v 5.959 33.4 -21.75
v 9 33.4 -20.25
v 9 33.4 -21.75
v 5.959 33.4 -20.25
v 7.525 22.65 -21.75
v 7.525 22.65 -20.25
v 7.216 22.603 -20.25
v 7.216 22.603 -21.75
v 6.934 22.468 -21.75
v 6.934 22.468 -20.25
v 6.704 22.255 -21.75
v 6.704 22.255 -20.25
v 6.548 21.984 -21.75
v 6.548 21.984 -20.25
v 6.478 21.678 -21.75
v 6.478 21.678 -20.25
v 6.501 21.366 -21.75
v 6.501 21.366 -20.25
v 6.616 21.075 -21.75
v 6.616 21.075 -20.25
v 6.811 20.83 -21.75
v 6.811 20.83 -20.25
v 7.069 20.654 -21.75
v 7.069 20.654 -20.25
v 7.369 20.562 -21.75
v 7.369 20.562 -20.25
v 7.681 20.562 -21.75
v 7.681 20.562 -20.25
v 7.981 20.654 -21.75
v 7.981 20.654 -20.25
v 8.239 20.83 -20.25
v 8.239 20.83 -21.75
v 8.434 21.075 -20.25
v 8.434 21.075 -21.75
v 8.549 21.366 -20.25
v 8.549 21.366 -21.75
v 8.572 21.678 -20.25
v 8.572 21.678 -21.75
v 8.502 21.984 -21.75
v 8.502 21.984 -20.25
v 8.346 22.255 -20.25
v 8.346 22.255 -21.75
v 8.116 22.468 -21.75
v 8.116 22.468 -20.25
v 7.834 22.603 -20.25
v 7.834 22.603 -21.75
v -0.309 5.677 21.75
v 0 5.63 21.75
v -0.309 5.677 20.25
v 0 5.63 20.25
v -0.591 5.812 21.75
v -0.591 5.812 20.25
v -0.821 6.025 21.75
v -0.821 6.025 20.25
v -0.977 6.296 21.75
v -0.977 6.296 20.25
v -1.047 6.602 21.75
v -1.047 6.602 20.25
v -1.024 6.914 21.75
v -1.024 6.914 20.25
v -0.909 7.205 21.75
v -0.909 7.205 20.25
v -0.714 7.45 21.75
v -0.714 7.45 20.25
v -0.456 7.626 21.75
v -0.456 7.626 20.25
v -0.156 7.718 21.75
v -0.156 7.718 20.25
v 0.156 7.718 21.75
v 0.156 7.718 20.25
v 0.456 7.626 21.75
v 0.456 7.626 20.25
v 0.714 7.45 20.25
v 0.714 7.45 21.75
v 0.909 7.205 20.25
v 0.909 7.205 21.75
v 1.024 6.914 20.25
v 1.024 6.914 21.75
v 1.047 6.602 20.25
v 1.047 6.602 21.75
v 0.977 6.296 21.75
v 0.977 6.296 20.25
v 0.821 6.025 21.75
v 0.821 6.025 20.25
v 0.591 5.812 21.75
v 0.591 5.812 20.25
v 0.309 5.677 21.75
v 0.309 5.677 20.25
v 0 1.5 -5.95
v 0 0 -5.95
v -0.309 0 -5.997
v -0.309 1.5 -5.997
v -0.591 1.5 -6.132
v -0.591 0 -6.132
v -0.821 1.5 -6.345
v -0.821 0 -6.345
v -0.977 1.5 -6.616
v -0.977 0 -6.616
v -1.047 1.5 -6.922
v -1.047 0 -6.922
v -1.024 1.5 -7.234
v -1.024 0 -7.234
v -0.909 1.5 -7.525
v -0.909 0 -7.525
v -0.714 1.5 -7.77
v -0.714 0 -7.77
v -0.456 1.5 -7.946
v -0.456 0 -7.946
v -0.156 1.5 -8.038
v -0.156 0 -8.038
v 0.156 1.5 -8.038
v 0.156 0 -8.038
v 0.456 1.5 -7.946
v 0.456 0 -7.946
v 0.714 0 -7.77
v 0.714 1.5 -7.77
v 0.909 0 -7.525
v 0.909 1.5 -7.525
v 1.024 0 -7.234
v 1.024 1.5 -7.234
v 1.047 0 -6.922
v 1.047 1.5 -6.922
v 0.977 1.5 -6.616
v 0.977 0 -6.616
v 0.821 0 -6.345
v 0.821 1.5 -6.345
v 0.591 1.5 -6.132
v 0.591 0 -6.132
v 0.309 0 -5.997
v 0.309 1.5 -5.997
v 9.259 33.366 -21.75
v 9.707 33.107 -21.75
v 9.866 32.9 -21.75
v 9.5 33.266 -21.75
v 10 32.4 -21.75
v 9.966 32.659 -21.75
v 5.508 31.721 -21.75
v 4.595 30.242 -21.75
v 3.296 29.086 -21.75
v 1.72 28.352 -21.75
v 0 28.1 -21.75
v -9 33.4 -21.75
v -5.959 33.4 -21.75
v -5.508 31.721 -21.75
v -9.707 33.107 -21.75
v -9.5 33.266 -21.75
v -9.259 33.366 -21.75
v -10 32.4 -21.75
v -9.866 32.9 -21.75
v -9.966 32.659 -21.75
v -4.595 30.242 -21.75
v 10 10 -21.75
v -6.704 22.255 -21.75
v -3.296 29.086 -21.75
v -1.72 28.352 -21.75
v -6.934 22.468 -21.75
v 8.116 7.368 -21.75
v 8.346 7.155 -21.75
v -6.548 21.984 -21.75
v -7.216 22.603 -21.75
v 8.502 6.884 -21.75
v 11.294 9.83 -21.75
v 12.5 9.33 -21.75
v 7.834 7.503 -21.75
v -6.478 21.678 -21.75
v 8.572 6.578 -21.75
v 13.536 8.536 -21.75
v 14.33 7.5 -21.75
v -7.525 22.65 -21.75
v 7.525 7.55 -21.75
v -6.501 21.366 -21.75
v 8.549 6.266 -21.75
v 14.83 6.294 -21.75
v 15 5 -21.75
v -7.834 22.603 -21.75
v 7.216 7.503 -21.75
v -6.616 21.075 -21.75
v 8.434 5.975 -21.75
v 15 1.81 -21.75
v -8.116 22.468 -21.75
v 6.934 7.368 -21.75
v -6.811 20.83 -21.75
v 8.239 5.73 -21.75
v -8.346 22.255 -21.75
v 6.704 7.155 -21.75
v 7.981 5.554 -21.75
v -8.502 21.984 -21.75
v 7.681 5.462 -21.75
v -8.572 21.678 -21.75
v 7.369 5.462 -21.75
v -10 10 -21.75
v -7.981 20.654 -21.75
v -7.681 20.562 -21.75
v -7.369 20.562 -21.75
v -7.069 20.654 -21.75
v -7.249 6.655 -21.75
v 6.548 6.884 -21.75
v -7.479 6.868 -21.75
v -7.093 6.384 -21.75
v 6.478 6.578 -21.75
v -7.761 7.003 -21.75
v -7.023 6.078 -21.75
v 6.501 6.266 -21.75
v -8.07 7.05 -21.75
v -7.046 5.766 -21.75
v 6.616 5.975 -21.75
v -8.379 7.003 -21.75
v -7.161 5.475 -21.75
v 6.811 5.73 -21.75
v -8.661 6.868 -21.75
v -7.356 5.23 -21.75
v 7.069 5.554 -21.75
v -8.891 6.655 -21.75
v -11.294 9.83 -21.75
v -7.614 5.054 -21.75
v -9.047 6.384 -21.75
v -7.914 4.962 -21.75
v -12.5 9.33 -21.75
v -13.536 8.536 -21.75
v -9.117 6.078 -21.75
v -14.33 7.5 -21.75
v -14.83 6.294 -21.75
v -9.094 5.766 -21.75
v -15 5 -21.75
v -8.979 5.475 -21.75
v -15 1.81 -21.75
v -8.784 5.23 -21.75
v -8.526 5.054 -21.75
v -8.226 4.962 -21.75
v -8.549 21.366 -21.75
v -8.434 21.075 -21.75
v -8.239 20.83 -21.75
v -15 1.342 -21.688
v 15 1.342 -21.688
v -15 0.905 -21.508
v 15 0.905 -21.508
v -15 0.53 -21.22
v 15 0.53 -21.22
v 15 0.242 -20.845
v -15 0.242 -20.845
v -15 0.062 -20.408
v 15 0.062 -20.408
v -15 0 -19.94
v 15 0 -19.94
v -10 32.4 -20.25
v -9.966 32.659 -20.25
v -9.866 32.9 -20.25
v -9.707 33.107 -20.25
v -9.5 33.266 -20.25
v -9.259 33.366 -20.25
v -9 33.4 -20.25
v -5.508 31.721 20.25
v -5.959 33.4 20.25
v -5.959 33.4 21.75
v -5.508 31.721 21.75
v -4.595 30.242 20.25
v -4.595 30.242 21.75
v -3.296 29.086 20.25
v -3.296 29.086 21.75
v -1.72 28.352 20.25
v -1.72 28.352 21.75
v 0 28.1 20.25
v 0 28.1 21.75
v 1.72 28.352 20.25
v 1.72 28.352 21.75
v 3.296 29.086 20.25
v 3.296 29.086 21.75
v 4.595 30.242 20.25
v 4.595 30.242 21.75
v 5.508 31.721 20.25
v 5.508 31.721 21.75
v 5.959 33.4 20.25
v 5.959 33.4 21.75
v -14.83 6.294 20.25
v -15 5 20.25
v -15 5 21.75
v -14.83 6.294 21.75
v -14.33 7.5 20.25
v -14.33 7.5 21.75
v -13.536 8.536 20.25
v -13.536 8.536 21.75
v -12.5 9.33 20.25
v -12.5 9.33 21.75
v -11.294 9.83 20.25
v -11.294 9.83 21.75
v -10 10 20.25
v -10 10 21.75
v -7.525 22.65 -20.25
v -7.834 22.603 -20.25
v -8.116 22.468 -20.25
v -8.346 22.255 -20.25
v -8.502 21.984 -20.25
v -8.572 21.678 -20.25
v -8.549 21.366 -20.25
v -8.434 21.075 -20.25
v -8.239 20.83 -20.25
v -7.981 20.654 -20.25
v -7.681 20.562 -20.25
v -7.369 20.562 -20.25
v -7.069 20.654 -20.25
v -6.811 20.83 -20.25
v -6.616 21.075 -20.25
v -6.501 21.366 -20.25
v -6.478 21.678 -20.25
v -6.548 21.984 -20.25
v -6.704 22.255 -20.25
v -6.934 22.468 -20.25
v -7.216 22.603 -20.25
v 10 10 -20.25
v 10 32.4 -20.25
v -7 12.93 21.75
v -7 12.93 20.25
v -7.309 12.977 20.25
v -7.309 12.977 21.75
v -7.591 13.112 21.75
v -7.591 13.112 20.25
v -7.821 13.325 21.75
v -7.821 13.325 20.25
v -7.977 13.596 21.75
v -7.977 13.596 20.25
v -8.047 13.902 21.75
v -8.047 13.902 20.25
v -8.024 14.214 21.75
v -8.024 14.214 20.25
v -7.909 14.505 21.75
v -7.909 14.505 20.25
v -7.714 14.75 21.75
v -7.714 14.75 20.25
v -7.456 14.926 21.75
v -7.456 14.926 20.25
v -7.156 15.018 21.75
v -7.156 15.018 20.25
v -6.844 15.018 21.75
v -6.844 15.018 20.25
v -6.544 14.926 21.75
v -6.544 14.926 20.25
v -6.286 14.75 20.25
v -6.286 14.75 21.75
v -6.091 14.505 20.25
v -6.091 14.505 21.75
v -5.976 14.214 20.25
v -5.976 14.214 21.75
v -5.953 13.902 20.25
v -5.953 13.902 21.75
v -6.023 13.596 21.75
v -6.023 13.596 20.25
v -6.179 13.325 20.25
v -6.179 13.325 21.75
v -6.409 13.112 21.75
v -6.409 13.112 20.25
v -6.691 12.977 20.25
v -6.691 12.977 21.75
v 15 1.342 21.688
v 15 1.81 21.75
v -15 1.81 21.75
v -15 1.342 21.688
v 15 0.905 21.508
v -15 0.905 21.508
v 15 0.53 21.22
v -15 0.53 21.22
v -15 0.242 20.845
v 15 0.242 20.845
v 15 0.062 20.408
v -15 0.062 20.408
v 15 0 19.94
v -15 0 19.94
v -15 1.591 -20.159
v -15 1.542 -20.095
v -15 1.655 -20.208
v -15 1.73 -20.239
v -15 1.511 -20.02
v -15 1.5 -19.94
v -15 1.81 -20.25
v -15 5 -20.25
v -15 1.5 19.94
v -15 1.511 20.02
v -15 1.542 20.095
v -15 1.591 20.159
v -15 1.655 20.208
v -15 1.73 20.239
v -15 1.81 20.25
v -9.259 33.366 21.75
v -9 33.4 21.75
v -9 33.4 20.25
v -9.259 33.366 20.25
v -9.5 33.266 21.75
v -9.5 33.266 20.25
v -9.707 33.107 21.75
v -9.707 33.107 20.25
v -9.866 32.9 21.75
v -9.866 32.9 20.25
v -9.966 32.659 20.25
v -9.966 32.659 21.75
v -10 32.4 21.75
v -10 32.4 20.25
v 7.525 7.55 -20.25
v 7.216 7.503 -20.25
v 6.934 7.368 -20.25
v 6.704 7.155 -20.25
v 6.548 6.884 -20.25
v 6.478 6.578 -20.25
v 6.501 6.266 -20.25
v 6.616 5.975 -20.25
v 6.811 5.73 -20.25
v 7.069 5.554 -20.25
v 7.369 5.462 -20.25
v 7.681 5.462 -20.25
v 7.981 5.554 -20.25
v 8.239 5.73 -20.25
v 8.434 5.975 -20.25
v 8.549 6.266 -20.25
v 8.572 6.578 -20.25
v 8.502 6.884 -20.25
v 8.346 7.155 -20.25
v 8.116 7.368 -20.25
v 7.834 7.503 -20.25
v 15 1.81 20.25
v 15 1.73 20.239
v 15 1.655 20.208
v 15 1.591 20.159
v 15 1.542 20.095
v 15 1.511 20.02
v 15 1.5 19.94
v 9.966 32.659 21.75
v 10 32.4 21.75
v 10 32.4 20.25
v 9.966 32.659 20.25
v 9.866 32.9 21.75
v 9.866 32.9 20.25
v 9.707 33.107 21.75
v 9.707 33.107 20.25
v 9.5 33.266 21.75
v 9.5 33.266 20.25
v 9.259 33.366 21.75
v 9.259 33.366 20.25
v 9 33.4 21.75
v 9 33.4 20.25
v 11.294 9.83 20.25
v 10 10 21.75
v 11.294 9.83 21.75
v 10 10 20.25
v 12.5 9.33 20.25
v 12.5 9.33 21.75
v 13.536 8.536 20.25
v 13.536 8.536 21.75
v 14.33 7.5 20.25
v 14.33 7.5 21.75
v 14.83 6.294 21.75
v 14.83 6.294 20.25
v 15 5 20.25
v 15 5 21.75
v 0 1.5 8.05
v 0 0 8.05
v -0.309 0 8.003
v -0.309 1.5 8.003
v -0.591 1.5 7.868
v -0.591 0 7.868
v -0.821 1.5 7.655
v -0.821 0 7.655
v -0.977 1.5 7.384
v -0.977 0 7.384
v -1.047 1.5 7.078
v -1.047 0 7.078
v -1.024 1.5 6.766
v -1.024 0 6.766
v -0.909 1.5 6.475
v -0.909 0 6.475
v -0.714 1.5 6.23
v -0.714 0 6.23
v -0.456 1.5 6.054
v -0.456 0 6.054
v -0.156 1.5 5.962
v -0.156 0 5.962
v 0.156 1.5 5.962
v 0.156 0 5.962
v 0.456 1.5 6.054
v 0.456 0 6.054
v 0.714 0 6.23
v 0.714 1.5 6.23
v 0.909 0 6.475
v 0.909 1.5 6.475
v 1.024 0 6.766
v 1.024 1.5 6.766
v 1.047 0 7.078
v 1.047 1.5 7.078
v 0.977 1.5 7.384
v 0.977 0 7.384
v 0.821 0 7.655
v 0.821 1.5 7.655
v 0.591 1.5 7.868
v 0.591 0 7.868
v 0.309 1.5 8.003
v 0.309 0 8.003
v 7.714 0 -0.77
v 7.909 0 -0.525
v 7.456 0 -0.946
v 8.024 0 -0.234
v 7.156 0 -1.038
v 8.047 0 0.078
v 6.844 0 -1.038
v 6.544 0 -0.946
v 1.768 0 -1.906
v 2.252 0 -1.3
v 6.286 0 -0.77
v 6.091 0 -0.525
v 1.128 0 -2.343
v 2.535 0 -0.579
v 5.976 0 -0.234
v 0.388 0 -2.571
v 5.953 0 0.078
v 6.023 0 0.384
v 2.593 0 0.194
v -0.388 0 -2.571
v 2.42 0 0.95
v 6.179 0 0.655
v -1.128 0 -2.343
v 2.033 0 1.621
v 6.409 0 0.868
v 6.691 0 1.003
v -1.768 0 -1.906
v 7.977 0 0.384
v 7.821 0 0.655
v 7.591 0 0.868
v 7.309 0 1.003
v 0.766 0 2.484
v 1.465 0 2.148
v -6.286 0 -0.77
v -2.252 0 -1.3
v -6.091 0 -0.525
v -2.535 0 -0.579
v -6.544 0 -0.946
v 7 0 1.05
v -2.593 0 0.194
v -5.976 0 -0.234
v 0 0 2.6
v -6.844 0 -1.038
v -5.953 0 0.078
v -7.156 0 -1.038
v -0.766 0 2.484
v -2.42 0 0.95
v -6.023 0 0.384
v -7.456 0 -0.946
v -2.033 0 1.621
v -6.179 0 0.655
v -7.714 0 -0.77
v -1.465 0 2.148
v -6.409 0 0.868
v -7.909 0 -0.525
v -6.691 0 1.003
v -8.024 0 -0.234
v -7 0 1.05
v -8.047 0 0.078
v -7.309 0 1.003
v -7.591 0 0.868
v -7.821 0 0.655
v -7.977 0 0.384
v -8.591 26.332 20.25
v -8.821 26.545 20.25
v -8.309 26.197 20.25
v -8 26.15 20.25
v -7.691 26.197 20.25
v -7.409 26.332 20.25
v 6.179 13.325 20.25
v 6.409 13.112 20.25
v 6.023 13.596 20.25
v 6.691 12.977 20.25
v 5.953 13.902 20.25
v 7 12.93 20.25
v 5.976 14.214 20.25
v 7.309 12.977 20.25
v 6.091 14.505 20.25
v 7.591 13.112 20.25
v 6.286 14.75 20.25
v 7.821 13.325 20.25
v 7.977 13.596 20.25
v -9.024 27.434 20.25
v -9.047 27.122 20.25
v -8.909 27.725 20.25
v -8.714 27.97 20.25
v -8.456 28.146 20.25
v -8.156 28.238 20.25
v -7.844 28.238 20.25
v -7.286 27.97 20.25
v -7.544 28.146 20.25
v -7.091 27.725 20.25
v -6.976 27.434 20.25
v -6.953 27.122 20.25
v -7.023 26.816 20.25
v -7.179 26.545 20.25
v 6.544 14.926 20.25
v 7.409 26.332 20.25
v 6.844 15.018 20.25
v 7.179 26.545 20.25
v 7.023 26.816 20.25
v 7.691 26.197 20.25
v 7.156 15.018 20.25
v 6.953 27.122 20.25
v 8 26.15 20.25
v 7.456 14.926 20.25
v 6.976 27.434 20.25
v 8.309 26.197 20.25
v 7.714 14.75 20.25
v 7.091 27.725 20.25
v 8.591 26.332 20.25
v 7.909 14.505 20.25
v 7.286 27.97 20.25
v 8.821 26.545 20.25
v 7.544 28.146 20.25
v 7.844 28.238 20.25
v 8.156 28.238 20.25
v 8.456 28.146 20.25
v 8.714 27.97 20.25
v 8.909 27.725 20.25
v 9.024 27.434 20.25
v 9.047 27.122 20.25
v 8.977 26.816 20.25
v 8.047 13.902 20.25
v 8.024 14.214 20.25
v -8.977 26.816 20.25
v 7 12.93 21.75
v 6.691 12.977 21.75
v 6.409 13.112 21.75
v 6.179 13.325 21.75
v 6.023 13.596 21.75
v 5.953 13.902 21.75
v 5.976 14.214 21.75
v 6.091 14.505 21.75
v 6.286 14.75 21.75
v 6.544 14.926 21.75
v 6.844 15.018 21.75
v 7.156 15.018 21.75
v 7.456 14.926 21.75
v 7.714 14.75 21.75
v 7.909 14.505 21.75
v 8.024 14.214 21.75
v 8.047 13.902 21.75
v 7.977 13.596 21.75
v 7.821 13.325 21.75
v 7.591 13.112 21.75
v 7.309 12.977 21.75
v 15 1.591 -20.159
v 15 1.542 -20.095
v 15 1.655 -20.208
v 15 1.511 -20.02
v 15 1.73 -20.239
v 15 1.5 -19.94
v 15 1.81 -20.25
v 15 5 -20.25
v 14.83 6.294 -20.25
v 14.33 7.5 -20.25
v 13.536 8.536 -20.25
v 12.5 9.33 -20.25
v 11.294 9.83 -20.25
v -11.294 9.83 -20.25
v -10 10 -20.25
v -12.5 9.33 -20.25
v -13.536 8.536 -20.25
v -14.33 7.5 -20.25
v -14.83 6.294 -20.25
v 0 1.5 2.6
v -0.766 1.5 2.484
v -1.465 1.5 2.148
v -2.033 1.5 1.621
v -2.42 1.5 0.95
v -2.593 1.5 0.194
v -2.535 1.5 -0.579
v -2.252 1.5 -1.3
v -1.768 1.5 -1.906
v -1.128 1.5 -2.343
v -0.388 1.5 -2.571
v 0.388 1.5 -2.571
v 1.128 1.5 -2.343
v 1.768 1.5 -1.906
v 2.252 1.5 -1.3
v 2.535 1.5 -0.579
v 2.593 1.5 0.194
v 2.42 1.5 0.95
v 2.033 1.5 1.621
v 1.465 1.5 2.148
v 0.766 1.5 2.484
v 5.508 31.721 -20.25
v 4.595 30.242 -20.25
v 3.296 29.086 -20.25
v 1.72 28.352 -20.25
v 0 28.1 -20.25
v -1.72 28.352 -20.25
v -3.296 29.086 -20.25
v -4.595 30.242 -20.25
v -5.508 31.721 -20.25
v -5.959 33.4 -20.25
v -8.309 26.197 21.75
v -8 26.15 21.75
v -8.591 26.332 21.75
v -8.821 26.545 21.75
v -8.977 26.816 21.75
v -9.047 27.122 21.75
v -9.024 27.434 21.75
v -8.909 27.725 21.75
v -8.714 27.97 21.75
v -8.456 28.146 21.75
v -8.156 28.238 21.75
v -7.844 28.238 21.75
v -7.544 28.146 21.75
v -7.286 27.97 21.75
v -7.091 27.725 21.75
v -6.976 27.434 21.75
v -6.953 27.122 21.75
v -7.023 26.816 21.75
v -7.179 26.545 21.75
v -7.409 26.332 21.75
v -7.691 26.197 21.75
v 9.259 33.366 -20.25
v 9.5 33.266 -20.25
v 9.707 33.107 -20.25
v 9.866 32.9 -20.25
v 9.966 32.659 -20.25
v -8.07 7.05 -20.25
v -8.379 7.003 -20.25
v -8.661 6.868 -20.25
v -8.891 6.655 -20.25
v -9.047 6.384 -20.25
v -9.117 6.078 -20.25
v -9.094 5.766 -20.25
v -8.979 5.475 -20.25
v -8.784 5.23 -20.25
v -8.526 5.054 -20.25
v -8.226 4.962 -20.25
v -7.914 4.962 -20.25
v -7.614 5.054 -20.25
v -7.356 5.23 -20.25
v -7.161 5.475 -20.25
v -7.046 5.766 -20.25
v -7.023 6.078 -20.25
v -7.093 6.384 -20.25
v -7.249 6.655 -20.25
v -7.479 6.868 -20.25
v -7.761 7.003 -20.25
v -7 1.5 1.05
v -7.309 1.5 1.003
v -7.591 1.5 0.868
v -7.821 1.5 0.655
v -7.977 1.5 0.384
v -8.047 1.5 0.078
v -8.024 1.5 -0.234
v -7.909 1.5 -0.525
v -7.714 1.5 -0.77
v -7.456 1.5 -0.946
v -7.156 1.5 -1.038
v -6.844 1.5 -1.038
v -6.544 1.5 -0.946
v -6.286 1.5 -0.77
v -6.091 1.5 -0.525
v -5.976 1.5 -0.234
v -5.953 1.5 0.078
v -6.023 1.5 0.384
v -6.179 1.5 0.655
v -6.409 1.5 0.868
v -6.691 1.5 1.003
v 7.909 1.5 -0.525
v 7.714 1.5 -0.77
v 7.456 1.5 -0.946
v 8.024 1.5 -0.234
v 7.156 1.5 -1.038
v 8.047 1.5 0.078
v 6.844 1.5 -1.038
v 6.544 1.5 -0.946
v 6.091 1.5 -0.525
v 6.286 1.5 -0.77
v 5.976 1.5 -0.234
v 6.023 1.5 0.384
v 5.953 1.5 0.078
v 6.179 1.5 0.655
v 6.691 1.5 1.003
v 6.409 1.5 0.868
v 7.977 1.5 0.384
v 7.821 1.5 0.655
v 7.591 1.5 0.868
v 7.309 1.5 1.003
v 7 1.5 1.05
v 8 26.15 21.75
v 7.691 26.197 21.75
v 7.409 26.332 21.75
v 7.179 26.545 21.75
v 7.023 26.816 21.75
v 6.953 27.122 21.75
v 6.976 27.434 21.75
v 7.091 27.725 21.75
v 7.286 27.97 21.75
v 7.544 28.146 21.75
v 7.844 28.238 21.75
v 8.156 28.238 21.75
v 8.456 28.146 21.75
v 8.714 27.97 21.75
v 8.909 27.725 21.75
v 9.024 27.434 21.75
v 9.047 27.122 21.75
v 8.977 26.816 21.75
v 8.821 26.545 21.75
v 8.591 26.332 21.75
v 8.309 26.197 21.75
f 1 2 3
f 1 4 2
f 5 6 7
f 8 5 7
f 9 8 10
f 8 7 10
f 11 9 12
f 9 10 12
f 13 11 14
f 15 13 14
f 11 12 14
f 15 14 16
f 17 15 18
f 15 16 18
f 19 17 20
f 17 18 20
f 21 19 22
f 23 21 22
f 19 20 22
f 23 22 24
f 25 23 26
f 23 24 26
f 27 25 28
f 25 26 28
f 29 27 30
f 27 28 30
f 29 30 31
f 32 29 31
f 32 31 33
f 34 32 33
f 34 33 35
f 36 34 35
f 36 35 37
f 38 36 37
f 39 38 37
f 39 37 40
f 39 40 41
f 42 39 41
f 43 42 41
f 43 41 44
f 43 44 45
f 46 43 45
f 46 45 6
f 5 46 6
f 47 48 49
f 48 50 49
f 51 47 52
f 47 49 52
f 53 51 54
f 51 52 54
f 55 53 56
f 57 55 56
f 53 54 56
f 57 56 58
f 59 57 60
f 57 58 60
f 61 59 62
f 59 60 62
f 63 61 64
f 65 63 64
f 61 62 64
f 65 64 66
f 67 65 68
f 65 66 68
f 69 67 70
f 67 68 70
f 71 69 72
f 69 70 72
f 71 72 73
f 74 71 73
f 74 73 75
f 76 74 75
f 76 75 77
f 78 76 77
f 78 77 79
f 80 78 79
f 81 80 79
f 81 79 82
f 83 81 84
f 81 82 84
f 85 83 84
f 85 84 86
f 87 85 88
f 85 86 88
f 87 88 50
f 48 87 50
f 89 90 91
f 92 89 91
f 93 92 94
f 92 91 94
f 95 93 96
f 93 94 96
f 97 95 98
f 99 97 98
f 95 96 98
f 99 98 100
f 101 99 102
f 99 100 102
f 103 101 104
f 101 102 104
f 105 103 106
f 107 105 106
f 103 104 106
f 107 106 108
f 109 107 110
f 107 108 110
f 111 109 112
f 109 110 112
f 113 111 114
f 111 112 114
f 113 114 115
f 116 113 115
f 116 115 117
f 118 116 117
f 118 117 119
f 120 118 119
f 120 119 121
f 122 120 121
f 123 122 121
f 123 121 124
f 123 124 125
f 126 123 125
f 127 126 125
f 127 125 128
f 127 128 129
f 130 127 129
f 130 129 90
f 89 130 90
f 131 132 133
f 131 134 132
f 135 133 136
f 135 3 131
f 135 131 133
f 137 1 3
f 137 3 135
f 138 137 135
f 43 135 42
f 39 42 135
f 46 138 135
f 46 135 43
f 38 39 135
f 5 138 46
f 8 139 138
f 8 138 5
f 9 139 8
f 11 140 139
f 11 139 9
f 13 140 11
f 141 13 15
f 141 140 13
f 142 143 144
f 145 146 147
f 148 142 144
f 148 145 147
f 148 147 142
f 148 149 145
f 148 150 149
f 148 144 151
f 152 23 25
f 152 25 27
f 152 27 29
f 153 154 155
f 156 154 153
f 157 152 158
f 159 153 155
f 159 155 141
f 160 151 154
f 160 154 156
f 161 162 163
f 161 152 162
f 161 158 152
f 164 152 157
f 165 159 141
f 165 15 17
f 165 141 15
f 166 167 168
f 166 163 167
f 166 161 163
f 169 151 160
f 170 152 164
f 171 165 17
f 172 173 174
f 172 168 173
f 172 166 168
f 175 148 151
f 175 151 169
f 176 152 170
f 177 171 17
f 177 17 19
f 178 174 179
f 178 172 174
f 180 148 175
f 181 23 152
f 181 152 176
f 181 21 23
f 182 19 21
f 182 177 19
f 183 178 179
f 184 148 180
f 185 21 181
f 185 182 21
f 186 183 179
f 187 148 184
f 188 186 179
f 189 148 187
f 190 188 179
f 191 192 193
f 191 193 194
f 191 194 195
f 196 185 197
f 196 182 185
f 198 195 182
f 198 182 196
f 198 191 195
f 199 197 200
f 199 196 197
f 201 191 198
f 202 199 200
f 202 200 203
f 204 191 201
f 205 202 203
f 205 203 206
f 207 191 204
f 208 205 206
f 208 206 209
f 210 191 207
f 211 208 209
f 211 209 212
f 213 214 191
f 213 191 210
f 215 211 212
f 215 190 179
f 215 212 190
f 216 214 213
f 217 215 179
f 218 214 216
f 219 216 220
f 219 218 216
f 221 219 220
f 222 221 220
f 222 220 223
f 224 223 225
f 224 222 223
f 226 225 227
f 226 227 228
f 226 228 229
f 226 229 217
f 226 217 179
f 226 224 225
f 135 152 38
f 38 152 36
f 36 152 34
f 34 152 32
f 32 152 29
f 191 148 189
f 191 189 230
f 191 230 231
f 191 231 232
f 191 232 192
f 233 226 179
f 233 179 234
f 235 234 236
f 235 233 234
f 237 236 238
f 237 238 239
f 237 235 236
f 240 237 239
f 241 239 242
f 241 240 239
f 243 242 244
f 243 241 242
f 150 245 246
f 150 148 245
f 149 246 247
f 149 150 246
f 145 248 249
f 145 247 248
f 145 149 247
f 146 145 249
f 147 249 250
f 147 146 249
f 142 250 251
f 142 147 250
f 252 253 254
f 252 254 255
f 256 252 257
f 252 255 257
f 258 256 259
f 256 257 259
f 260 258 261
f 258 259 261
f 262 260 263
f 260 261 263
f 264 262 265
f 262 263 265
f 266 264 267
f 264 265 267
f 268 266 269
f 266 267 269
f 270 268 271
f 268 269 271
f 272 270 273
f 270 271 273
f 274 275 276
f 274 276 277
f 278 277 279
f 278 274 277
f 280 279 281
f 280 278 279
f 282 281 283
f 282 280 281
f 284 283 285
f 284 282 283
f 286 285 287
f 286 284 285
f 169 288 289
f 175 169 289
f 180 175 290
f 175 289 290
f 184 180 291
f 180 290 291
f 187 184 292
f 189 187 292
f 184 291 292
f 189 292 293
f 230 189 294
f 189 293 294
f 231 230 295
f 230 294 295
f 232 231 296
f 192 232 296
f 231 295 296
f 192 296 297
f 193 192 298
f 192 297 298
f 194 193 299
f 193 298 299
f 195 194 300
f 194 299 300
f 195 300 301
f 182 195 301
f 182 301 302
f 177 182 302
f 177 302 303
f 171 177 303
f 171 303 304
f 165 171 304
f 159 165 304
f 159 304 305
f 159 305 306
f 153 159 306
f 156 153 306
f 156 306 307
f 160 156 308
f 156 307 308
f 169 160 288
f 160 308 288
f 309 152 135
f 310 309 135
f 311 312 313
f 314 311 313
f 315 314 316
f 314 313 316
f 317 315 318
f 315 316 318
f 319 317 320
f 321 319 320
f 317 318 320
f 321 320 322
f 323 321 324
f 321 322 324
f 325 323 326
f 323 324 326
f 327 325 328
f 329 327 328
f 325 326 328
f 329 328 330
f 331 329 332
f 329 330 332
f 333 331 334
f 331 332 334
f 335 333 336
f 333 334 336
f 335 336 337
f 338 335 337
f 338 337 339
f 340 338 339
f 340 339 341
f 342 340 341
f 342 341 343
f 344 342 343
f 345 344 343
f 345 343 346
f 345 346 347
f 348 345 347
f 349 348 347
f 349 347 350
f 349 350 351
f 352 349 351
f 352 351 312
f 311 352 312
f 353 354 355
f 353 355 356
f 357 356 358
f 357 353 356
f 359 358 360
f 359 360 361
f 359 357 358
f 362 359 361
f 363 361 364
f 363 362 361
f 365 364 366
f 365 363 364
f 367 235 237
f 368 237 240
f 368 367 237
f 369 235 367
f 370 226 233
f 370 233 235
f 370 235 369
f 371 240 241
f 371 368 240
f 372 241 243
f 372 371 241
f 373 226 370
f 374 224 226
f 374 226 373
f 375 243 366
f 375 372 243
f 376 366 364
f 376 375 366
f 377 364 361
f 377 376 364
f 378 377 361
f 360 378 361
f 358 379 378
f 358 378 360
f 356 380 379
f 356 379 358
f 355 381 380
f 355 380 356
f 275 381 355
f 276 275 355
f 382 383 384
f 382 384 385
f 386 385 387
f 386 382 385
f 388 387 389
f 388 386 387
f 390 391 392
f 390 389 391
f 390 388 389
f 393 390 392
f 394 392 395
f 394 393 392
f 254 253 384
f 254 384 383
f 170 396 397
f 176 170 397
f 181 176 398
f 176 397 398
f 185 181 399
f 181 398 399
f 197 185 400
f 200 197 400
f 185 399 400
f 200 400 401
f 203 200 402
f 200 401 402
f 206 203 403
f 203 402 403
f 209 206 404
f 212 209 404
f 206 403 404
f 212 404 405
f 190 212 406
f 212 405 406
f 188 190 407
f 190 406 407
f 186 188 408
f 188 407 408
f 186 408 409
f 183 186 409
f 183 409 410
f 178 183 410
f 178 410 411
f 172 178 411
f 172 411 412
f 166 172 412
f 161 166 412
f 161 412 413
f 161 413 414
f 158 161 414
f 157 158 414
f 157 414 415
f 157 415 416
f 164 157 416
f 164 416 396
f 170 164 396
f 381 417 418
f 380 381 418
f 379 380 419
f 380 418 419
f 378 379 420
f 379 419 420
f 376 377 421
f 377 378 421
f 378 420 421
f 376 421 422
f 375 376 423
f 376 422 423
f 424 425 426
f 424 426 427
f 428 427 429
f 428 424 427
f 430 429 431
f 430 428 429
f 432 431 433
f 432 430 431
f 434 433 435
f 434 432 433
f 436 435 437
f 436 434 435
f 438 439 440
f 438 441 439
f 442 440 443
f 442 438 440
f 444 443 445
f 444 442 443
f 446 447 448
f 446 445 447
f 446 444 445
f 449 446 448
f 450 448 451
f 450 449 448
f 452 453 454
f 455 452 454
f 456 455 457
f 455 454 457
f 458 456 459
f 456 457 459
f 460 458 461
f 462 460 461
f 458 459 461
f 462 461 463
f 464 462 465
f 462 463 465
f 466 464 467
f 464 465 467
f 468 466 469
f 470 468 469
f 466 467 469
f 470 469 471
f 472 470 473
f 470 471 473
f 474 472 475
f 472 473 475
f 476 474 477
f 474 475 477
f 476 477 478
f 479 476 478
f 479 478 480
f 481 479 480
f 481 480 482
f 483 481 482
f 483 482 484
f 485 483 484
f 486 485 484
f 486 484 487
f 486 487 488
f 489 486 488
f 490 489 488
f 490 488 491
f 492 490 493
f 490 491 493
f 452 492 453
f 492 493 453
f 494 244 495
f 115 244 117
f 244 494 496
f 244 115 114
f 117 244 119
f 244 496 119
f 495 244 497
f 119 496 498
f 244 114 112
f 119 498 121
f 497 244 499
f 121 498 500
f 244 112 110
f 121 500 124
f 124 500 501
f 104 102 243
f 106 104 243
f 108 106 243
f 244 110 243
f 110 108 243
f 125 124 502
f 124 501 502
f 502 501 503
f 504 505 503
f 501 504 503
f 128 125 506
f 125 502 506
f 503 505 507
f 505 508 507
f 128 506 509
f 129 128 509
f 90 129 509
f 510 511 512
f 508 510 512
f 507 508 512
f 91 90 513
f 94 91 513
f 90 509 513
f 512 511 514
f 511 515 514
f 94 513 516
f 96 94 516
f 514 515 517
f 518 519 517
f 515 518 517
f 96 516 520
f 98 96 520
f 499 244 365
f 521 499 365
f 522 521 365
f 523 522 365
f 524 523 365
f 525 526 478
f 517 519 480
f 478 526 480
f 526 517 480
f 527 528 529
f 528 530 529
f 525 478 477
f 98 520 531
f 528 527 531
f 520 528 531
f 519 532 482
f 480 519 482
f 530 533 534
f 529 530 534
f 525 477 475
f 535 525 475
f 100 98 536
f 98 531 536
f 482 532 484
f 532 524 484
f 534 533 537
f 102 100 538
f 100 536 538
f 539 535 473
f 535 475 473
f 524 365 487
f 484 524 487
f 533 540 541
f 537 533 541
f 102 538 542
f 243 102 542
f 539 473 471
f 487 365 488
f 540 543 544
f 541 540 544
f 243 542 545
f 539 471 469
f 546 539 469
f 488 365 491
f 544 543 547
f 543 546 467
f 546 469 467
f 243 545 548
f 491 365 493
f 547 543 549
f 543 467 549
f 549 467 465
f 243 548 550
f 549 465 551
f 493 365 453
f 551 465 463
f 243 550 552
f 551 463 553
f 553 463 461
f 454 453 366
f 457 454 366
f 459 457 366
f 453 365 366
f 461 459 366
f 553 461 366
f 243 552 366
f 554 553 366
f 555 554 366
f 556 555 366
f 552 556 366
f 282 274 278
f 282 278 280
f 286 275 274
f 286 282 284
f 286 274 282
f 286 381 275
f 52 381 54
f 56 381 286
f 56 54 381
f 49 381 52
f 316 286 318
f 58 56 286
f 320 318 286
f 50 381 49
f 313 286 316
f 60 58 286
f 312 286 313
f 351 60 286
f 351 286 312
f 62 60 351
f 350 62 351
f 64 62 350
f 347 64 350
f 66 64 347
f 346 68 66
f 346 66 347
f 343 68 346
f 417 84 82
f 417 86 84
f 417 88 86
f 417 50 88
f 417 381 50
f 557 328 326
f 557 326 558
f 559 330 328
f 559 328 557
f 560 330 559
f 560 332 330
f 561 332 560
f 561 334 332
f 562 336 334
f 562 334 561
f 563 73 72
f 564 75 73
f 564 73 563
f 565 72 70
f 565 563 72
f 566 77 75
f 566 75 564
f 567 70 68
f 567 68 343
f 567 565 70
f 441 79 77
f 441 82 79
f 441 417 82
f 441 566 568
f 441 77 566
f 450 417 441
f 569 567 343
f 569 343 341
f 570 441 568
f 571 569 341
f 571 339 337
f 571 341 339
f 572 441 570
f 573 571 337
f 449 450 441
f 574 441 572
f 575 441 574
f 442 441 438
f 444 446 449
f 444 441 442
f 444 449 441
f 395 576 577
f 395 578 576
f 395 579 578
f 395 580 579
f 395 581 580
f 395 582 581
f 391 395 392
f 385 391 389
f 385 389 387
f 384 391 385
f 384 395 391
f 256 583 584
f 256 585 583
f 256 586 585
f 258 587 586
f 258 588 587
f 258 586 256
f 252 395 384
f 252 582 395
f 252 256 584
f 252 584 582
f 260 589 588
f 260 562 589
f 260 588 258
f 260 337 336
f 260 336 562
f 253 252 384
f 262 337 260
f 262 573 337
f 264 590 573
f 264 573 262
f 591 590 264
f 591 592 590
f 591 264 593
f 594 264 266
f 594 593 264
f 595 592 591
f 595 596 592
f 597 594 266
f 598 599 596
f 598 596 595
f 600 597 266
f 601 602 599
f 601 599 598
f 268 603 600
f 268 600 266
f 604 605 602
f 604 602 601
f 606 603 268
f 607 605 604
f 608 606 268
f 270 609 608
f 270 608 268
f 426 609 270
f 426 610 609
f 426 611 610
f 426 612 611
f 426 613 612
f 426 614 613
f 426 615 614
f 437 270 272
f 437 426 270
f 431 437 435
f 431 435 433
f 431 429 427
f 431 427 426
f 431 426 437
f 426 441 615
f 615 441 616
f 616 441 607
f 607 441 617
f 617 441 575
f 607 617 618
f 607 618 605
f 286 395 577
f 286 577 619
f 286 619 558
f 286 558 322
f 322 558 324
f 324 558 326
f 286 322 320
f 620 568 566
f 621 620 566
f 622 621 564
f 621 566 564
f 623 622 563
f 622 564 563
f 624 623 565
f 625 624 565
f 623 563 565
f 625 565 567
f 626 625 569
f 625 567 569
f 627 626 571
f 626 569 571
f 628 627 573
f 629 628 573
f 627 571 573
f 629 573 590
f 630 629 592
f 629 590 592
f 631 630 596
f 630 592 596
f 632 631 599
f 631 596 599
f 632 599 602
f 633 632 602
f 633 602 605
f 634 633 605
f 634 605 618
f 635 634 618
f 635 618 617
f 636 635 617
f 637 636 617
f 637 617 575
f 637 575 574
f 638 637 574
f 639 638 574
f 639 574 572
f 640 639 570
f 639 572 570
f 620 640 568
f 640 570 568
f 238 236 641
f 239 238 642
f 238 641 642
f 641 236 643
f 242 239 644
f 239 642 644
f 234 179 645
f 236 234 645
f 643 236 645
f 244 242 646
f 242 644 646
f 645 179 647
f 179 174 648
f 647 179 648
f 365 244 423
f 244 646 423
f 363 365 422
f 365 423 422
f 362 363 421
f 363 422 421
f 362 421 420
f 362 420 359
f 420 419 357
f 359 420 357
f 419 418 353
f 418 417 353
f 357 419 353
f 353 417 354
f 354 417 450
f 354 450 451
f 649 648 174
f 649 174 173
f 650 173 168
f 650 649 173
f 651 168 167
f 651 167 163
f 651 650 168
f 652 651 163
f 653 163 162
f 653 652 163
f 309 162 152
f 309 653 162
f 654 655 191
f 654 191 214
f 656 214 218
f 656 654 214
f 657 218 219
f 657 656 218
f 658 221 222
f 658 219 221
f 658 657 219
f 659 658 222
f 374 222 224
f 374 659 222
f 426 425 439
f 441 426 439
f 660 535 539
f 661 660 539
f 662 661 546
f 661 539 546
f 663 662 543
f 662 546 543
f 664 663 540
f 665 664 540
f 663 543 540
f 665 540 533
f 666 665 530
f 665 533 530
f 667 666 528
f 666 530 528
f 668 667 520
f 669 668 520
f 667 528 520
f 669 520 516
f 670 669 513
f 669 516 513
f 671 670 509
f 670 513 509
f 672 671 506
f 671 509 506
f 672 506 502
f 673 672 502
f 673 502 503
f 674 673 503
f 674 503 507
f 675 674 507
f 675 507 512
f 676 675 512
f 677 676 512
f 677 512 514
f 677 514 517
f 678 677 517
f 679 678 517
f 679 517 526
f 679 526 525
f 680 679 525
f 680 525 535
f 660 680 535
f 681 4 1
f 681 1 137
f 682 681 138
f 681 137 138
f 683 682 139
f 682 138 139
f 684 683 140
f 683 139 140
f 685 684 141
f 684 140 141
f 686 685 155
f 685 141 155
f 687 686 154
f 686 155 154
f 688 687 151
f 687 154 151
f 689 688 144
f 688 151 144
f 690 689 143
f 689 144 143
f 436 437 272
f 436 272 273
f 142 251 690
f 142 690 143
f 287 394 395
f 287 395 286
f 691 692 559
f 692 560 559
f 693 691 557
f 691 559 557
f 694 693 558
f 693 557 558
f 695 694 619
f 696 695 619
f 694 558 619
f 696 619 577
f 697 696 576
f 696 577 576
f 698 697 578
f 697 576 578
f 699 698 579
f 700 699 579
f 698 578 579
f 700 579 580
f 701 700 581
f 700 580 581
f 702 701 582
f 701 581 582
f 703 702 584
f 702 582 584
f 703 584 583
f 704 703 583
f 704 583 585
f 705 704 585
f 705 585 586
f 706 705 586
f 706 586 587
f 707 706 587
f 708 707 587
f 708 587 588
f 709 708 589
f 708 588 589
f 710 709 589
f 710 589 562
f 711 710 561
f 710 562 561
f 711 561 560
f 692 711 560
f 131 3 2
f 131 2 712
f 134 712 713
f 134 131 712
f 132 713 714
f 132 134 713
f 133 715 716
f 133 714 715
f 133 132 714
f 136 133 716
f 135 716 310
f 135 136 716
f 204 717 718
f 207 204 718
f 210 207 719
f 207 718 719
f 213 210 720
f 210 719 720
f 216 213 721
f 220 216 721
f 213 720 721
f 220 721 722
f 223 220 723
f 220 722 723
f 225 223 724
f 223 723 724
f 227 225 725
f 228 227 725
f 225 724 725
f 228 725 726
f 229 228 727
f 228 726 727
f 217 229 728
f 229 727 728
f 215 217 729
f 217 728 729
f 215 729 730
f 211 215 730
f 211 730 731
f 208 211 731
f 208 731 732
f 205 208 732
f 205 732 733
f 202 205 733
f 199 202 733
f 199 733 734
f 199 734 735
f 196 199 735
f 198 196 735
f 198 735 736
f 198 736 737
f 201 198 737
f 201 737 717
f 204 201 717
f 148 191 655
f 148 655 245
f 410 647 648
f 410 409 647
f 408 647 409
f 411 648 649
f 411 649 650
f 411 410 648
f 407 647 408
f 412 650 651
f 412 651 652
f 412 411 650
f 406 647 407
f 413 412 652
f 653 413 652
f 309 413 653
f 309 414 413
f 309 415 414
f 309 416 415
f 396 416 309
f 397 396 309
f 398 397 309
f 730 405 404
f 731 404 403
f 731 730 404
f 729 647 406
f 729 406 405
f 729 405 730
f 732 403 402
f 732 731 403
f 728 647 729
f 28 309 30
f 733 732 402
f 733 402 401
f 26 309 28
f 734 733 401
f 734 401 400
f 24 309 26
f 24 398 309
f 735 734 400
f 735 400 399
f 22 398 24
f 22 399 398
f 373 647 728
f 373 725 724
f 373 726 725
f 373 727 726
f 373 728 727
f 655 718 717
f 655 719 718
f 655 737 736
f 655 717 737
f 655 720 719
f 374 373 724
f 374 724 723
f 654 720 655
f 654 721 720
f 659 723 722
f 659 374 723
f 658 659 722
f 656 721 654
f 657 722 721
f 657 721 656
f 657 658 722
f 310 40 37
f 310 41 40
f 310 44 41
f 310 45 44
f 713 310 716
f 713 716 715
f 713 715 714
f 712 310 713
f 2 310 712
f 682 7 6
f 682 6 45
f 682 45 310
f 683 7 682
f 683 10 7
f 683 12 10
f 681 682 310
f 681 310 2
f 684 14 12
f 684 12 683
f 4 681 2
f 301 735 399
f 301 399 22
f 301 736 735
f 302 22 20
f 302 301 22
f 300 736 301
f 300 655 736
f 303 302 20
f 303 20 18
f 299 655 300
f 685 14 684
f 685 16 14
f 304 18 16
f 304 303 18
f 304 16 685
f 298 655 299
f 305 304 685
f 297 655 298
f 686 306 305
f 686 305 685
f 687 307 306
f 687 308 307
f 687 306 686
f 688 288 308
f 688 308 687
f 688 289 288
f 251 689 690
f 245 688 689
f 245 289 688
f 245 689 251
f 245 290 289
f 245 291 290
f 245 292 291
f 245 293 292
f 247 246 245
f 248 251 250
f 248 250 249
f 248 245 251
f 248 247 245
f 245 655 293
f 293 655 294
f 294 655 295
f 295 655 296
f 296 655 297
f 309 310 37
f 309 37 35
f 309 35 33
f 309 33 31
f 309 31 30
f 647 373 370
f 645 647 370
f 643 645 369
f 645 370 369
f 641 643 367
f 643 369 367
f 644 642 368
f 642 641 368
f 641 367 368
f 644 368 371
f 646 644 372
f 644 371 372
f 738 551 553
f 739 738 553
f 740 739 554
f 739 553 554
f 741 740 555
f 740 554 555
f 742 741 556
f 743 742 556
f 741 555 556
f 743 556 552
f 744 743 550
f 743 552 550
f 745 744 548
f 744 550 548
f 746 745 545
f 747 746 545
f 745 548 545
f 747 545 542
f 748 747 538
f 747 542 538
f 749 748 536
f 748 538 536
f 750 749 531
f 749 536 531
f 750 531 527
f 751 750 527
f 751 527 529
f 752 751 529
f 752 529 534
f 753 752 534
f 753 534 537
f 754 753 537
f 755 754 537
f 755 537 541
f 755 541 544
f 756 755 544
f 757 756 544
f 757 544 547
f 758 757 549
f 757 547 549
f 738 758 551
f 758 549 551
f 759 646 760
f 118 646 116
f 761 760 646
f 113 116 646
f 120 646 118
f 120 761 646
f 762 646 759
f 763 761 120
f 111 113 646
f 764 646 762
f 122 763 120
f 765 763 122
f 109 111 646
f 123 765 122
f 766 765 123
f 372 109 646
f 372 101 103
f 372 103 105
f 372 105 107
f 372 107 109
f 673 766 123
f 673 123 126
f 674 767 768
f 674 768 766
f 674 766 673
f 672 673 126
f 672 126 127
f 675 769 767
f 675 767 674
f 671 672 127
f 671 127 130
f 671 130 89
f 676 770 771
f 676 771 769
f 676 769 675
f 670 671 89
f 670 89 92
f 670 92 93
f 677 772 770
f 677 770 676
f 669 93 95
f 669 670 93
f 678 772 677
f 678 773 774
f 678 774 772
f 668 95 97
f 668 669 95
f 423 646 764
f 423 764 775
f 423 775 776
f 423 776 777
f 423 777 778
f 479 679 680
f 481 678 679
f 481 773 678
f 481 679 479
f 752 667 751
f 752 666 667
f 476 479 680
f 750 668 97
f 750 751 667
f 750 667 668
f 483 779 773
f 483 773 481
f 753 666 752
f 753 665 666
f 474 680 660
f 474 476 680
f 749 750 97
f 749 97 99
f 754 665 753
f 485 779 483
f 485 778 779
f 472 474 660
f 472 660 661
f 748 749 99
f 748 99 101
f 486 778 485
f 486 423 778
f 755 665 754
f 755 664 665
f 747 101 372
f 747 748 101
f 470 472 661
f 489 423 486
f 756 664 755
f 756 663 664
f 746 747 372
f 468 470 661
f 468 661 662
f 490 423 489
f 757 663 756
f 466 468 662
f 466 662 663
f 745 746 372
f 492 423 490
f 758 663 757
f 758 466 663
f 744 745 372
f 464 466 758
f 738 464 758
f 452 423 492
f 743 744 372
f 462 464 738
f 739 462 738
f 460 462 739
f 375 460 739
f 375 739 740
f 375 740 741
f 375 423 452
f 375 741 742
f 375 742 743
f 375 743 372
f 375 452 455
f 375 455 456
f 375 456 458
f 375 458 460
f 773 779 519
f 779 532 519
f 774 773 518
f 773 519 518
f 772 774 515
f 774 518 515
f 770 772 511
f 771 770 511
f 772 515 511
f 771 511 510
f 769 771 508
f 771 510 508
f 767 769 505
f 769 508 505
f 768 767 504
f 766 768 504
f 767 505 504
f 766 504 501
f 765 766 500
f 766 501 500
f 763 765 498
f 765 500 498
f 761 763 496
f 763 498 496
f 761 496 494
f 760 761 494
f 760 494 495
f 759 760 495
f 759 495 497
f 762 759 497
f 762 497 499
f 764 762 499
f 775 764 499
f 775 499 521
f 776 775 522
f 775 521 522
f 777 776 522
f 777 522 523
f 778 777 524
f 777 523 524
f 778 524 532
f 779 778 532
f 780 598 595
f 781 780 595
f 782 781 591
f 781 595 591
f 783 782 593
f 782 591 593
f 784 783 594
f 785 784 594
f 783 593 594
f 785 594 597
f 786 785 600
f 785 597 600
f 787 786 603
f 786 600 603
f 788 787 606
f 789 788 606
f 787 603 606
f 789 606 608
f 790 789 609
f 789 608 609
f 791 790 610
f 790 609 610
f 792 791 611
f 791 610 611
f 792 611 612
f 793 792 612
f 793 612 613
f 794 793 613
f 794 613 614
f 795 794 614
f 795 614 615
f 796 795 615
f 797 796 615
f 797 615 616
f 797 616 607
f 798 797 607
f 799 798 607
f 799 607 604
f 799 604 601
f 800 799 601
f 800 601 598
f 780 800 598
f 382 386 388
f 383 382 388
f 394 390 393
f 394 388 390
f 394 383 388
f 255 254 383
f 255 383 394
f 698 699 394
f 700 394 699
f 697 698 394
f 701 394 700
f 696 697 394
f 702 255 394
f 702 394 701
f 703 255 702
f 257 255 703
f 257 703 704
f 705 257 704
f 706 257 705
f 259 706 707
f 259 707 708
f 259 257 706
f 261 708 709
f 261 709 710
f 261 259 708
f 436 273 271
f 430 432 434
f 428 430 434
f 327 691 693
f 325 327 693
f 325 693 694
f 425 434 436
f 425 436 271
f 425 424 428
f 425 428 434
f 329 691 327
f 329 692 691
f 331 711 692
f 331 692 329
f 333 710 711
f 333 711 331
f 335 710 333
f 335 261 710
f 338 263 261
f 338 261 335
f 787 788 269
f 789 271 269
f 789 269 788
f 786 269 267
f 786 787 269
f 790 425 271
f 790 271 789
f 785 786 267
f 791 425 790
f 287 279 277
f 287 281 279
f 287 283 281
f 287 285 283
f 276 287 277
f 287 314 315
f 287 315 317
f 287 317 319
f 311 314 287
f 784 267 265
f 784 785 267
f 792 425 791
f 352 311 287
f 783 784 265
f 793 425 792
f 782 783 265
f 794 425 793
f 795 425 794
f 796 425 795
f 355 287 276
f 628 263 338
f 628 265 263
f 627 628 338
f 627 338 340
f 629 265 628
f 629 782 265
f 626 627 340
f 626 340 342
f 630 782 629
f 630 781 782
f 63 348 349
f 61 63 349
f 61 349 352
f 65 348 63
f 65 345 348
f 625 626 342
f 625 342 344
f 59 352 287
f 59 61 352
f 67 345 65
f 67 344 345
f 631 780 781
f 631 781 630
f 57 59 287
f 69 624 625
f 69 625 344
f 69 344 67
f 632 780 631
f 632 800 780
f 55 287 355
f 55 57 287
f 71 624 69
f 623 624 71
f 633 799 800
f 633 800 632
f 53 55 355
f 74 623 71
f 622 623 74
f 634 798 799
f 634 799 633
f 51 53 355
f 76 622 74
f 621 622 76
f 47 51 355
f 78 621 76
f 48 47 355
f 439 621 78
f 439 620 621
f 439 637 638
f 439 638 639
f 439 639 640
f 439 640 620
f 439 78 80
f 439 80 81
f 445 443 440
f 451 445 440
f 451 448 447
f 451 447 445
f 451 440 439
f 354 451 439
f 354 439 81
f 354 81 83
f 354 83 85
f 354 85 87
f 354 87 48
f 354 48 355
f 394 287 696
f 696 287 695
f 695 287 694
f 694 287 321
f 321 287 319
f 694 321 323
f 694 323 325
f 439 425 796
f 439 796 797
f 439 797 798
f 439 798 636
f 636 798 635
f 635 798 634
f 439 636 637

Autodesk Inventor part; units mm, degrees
ref_plane "YZ Plane" through (0, 0, 0) normal (1, 0, 0) x (0, 1, 0)
ref_plane "XZ Plane" through (0, 0, 0) normal (0, 1, 0) x (-1, 0, 0)
ref_plane "XY Plane" through (0, 0, 0) normal (0, 0, 1) x (1, 0, 0)
sketch "Sketch1" plane through (0, 0, 0) normal (0, 1, 0) x (-1, 0, 0)
  line L0 (-15, 20.25) -> (15, 20.25)
  line L1 (15, 20.25) -> (15, -20.25)
  line L2 (15, -20.25) -> (-15, -20.25)
  line L3 (-15, -20.25) -> (-15, 20.25)
  line L4 (-15, 20.25) -> (15, -20.25) construction
  line L5 (15, 20.25) -> (-15, -20.25) construction
  point P0 (0, 0)
  dimension "d0" = 40.5
  dimension "d1" = 30
extrude "Plate1" add sketch "Sketch1" along normal blind 1.5
sketch "Sketch2" plane through (-15, 0, -21.75) normal (0, 0, 1) x (1, 0, 0)
  line L0 (30, 0) -> (0, 0)
  line L1 (0, 0) -> (0, 33.4)
  line L2 (0, 33.4) -> (30, 33.4)
  line L3 (30, 33.4) -> (30, 0)
edge flange "Flange1" height 33.4 angle 90 thickness 1.5 bend radius 0.31 thickness toward (0, 0, 1) relief tear relief width 1.5 relief depth 0.75 corner gap 0.31 corner form 0 edges at (0, 1.5, -20.25) (0, 1.5, 20.25) wall of the first edge with corners at (15, 0, -21.75) (-15, 0, -21.75) (-15, 33.4, -21.75) (15, 33.4, -21.75)
bend "Bend1"
corner "Corner1"
sketch "Sketch3" plane through (0, 1.5, 0) normal (0, 1, 0) x (1, 0, 0)
  circle A0 centre (7, 0) radius 0.7835 projected
  circle A1 centre (0, -7) radius 0.7835 projected
  circle A2 centre (-7, 0) radius 0.7835 projected
  circle A3 centre (0, 7) radius 0.7835 projected
  point P0 (0, 0)
hole "Hole1" at (0, 1.5, 7) at (7, 1.5, 0) at (-7, 1.5, 0) at (0, 1.5, -7) direction (0, -1, 0) diameter 2.1 depth 1.5
sketch "Sketch26" plane through (-15, 33.4, 21.75) normal (0, 0, 1) x (1, 0, 0)
  line L0 (30, 11.6) -> (25, 11.6)
  line L1 (25, 11.6) -> (25, -23.4)
  line L2 (25, -23.4) -> (30, -23.4)
  line L3 (30, -23.4) -> (30, 11.6)
  line L4 (0, 11.6) -> (5, 11.6)
  line L5 (5, 11.6) -> (5, -23.4)
  line L6 (5, -23.4) -> (0, -23.4)
  line L7 (0, -23.4) -> (0, 11.6)
  point P0 (15, -33.4)
  dimension "d91" = 35
  dimension "d92" = 5
  dimension "d93" = 10
  dimension "d94" = 10
  dimension "d95" = 5
  dimension "d96" = 35
  dimension "d97" = 10
  dimension "d98" = 10
extrude "Cut11" cut sketch "Sketch26" against normal blind 1.5
fillet "Corner Round1" radius 5 1 edges at (-15, 10, 21)
fillet "Corner Round2" radius 5 1 edges at (15, 10, 21)
mirror "Mirror1" about plane through (0, 0, 0) normal (0, 0, 1) of "Cut11"
fillet "Corner Round3" radius 5 1 edges at (-15, 10, -21)
fillet "Corner Round4" radius 5 1 edges at (15, 10, -21)
sketch "Sketch27" plane through (-15, 1.81, 21.75) normal (0, 0, 1) x (1, 0, 0)
  circle A0 centre (15, 32.29) radius 6
  point P0 (15, -1.81)
extrude "Cut12" cut sketch "Sketch27" against normal blind 1.5
sketch "Sketch28" plane through (15, 1.81, -21.75) normal (0, 0, -1) x (-1, 0, 0)
  circle A0 centre (15, 32.29) radius 6
  point P0 (15, -1.81)
extrude "Cut13" cut sketch "Sketch28" against normal blind 1.5
fillet "Corner Round5" radius 1 4 edges at (10, 33.4, -21) (10, 33.4, 21) (-10, 33.4, 21) (-10, 33.4, -21)
sketch "Sketch31" plane through (-15, 1.81, 21.75) normal (0, 0, 1) x (1, 0, 0)
  point P0 (15, -1.81)
sketch "Sketch32" plane through (-15, 1.81, 21.75) normal (0, 0, 1) x (1, 0, 0)
  circle A0 centre (23, 25.39) radius 0.7835
  circle A1 centre (22, 12.17) radius 0.7835
  circle A2 centre (7, 25.39) radius 0.7835
  circle A3 centre (8, 12.17) radius 0.7835
  circle A4 centre (15, 4.87) radius 0.7835
  point P0 (15, -1.81)
hole "Hole11" at (8, 27.2, 21.75) at (7, 13.98, 21.75) at (-8, 27.2, 21.75) at (-7, 13.98, 21.75) at (0, 6.68, 21.75) direction (0, 0, -1) diameter 2.1 depth 1.5
sketch "Sketch33" plane through (15, 1.81, -21.75) normal (0, 0, -1) x (-1, 0, 0)
  circle A0 centre (23.07, 4.19) radius 0.7835
  circle A1 centre (7.475, 4.69) radius 0.7835
  circle A2 centre (7.475, 19.79) radius 0.7835
  circle A3 centre (22.525, 19.79) radius 0.7835
  point P0 (15, -1.81)
hole "Hole12" at (7.525, 6.5, -21.75) at (-8.07, 6, -21.75) at (7.525, 21.6, -21.75) at (-7.525, 21.6, -21.75) direction (0, 0, 1) diameter 2.1 depth 1.5
sketch "Sketch34" plane through (0, 1.5, 0) normal (0, 1, 0) x (1, 0, 0)
  circle A0 centre (0, 0) radius 1.2295
  point P0 (0, 0)
hole "Hole13" at (0, 1.5, 0) direction (0, -1, 0) diameter 5.2 depth 1.5
equation "\"d18\" = Thickness"
equation "\"d99\" = Thickness"
equation "\"d105\" = Thickness"
equation "\"d107\" = Thickness"
equation "\"d129\" = Thickness"
equation "\"d136\" = Thickness"
equation "\"d143\" = Thickness"
equation "\"d2\" = Thickness"
equation "\"d3\" = BendReliefWidth"
equation "\"d4\" = BendReliefDepth"
equation "\"d5\" = MinimumRemnant"
equation "\"d6\" = TransitionRadius"
equation "\"d9\" = BendRadius"
equation "\"d10\" = CornerReliefSize"
equation "\"d11\" = GapSize"
equation "\"d12\" = JacobiRadiusSize"
equation "\"BendReliefWidth\" = Thickness"
equation "\"BendReliefDepth\" = 0.5 * Thickness"
equation "\"CornerReliefSize\" = 4 * Thickness"
equation "\"MinimumRemnant\" = 2 * Thickness"
equation "\"TransitionRadius\" = BendRadius"
equation "\"JacobiRadiusSize\" = BendRadius"
equation "\"GapSize\" = Thickness"
equation "\"Thickness\" = 1.5"
equation "\"BendRadius\" = 0.31"
properties part number "axis_19_top_frame" material "Aluminum 6061-AHC"
